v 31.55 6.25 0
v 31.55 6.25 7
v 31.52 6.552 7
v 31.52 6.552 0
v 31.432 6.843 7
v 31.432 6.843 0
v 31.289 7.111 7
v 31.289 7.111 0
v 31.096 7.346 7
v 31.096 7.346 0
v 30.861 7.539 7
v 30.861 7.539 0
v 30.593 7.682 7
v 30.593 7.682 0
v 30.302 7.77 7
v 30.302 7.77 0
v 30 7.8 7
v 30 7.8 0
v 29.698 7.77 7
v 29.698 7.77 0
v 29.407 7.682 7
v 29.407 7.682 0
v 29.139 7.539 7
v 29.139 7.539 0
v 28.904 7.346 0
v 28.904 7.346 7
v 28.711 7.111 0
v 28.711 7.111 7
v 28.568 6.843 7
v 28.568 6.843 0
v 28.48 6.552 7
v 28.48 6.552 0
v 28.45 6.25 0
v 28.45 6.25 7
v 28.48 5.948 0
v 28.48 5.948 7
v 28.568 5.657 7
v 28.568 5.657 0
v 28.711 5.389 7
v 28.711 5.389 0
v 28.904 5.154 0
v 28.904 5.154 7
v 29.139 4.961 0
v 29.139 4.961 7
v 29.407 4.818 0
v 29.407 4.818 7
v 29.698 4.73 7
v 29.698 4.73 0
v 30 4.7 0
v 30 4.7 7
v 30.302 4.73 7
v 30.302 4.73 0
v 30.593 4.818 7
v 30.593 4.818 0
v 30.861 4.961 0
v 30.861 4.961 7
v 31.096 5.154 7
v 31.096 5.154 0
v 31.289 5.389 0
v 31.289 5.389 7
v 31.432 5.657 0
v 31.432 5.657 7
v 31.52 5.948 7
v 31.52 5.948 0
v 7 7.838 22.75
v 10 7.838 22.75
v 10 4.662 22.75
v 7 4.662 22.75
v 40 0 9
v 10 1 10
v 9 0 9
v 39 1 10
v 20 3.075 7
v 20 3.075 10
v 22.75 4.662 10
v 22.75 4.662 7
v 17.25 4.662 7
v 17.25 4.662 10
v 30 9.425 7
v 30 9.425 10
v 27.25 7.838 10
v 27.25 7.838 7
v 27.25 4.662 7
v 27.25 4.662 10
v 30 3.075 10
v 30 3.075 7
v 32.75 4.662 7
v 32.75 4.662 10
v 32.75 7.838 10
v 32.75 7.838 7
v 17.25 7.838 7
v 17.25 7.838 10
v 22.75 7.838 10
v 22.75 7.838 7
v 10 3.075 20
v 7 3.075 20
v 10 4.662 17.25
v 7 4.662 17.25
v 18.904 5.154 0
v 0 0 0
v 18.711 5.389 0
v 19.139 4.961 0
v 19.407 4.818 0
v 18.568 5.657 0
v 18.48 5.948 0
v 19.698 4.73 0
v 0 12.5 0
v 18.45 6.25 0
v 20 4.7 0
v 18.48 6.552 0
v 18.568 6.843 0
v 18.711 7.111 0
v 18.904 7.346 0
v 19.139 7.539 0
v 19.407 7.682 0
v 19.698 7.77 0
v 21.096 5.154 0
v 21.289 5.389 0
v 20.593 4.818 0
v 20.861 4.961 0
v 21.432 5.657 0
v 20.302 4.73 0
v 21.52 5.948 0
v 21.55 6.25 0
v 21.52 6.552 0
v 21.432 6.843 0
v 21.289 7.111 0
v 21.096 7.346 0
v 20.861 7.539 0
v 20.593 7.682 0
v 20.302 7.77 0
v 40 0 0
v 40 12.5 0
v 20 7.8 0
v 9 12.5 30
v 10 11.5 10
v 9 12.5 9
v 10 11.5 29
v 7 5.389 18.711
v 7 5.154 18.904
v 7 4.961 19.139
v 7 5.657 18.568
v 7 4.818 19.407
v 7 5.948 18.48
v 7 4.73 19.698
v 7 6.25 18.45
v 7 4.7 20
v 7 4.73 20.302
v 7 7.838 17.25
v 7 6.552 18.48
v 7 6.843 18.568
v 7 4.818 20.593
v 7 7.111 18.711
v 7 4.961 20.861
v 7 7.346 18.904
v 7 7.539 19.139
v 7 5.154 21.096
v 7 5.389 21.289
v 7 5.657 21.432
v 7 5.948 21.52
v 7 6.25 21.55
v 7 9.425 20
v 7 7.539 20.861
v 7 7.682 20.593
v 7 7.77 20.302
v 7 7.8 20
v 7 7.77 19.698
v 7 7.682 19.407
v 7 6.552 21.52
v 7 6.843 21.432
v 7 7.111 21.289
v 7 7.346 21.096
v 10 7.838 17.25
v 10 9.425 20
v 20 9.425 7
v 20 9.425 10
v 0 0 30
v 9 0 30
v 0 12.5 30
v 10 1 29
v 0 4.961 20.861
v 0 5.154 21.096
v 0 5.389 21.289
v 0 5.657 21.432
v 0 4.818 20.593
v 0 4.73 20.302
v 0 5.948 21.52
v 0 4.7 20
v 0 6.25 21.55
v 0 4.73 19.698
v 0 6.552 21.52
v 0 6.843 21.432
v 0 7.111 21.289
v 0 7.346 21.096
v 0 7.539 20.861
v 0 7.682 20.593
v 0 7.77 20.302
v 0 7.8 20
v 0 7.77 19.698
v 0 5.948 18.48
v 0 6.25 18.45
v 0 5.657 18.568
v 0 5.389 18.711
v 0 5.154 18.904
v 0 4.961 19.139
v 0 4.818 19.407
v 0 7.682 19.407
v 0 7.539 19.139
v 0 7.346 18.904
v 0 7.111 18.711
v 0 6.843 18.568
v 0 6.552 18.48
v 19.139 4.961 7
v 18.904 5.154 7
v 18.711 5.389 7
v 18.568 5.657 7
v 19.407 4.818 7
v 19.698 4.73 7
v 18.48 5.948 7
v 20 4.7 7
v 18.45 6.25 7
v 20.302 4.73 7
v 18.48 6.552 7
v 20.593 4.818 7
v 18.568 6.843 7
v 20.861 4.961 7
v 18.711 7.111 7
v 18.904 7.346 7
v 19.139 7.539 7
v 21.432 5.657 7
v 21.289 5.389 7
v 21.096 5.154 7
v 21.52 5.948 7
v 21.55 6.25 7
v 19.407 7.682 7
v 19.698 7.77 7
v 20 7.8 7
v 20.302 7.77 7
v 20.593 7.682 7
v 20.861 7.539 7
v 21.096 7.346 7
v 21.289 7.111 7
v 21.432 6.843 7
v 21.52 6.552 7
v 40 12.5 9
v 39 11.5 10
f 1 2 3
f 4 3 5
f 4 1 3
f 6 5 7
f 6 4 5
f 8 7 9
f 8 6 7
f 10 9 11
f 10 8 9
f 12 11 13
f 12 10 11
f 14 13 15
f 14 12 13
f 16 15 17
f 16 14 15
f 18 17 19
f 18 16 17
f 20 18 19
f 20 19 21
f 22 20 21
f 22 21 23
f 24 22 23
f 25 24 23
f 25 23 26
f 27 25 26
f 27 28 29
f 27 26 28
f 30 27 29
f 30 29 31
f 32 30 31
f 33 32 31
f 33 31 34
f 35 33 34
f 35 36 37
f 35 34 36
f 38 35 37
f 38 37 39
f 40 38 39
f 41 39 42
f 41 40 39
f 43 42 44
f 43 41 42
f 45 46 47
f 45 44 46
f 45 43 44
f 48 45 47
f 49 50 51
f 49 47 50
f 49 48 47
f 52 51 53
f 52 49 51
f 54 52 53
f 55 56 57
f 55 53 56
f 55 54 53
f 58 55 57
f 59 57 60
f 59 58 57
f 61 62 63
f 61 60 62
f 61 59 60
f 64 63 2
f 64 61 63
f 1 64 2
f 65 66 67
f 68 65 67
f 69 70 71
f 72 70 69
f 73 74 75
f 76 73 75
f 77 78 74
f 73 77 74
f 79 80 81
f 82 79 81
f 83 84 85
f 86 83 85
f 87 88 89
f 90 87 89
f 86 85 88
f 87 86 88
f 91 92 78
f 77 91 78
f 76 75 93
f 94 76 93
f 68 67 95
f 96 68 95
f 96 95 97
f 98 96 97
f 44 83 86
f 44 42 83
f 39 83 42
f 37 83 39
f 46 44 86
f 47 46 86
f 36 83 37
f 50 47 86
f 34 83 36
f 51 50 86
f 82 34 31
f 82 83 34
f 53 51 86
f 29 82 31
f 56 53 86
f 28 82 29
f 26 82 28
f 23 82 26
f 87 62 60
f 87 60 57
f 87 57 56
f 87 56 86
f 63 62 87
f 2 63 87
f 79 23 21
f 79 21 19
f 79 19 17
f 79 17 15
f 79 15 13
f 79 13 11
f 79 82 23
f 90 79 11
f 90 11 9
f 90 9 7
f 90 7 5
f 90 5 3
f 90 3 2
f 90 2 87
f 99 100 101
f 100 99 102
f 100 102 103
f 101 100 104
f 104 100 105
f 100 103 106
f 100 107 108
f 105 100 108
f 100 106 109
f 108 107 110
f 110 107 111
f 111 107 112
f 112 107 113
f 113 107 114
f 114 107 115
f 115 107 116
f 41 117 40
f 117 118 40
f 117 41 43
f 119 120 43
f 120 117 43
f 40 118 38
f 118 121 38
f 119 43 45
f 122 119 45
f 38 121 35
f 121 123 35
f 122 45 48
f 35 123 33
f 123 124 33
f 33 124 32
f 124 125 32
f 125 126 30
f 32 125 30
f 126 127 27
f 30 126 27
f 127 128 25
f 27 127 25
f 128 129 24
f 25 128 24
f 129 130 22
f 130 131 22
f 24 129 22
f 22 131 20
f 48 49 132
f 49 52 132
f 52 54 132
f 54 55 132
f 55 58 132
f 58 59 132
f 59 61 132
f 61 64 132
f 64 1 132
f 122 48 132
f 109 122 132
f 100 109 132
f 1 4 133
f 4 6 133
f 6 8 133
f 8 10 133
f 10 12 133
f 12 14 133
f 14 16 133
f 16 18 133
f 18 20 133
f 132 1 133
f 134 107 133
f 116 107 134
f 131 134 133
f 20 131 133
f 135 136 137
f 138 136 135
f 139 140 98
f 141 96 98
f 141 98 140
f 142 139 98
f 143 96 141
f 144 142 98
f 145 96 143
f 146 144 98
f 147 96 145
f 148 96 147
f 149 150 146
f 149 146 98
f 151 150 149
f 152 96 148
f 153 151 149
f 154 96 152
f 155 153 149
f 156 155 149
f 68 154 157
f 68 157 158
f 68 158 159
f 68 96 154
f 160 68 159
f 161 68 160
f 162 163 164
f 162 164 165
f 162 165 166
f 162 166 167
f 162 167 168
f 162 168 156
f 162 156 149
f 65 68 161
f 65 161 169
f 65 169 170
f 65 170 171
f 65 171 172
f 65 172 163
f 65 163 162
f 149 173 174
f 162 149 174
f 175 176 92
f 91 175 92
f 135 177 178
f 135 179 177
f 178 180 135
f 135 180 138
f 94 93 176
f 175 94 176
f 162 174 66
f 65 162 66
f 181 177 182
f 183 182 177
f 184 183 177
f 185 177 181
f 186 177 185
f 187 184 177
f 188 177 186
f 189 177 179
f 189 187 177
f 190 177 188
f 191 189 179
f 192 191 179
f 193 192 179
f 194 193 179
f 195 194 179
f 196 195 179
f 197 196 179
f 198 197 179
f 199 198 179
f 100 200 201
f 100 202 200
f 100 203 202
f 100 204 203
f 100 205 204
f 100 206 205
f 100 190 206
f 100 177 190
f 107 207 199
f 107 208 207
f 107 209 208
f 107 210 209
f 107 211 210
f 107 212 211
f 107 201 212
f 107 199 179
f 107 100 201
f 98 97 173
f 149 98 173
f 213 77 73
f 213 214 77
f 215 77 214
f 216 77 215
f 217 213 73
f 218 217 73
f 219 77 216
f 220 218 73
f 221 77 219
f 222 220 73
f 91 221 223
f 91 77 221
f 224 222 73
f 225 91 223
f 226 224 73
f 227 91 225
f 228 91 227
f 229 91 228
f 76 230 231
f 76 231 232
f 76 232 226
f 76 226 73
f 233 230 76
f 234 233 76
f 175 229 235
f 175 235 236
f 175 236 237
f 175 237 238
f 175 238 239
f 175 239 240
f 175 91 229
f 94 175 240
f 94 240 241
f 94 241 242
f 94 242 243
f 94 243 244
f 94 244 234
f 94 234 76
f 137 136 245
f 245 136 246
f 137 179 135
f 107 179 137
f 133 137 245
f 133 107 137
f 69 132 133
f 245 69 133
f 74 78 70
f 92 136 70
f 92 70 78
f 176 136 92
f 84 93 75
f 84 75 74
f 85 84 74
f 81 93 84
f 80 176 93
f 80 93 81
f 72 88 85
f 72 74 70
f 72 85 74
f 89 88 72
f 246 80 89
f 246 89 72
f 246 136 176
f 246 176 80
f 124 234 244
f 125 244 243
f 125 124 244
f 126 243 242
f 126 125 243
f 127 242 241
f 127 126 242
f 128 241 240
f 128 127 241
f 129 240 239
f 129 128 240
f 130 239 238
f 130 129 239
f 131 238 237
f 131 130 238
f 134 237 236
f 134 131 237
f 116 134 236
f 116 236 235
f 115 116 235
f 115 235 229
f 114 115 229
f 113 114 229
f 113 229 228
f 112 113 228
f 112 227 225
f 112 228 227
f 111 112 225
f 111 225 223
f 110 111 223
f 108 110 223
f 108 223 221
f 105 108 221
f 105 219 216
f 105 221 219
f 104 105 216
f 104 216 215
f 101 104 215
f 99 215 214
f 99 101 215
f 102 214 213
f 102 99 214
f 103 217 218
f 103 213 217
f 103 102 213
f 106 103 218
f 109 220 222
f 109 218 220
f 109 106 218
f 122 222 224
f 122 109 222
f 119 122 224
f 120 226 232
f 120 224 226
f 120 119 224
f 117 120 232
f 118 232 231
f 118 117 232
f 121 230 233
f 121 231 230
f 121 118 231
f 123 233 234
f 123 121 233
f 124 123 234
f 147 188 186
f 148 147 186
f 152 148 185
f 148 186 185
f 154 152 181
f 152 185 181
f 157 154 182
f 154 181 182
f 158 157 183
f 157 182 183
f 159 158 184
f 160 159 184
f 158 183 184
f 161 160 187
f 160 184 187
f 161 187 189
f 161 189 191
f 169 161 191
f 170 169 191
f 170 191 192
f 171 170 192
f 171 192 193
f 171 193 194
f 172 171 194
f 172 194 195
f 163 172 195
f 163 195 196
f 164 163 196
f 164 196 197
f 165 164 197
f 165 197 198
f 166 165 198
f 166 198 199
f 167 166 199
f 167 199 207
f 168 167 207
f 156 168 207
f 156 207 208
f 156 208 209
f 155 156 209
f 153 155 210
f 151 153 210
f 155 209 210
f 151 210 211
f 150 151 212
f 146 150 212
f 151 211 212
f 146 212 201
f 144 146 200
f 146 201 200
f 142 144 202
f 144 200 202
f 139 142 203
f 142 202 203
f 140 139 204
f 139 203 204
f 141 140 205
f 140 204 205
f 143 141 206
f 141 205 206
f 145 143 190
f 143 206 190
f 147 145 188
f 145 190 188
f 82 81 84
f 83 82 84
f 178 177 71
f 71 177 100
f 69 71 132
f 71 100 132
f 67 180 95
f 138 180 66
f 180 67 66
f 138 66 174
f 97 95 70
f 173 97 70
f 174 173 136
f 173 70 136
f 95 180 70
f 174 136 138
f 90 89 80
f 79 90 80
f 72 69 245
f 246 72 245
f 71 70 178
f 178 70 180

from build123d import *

# Parameters (mm, degrees)
F0_W     = 30
F0_H     = 12.5
F0_R     = 1.55
F1_DEPTH = 10
F0_W_2   = 10
F2_DEPTH = 30
F3_R     = 1.55
F4_DEPTH = 10
F5_SIZE  = 1
F7_DEPTH = 3
F9_DEPTH = 3


# Not quite as in the source:
# - a feature names something its author has since deleted; it is built from what else it names


with BuildPart() as f1:
    # F0 (on Top) → F1 (new body)
    with BuildSketch(Plane.XY):
        with Locations((25, 6.25)):
            Rectangle(F0_W, F0_H)
        with Locations((20, 6.25)):
            Circle(F0_R, mode=Mode.SUBTRACT)
        with Locations((30, 6.25)):
            Circle(F0_R, mode=Mode.SUBTRACT)
    extrude(amount=F1_DEPTH)

    # F0 (on Top) → F2 (join)
    with BuildSketch(Plane.XY):
        with Locations((5, 6.25)):
            Rectangle(F0_W_2, F0_H)
    extrude(amount=F2_DEPTH)

    # F3 (on face) → F4 (cut)
    with BuildSketch(Plane(origin=(0, 0, 0), x_dir=(0, -1, 0), z_dir=(-1, 0, 0))):
        with Locations((-6.25, 20)):
            Circle(F3_R)
    extrude(amount=-F4_DEPTH, mode=Mode.SUBTRACT)

    # F5
    f5_edges = [f1.edges().sort_by_distance(p)[0] for p in [
        (25, 0, 10),
        (40, 6.25, 10),
        (25, 12.5, 10),
        (10, 12.5, 20),
        (10, 6.25, 30),
        (10, 0, 20),
    ]]
    chamfer(f5_edges, length=F5_SIZE)

    # F6 (on face) → F7 (cut)
    with BuildSketch(Plane.XY.offset(10)):
        Polygon((22.75, 4.6622867597), (22.75, 7.8377132403), (20, 9.4254264805), (17.25, 7.8377132403), (17.25, 4.6622867597), (20, 3.0745735195), align=None)
        Polygon((32.75, 4.6622867597), (32.75, 7.8377132403), (30, 9.4254264805), (27.25, 7.8377132403), (27.25, 4.6622867597), (30, 3.0745735195), align=None)
    extrude(amount=-F7_DEPTH, mode=Mode.SUBTRACT)

    # F8 (on face) → F9 (cut)
    with BuildSketch(Plane.YZ.offset(10)):
        Polygon((4.6622867597, 17.25), (7.8377132403, 17.25), (9.4254264805, 20), (7.8377132403, 22.75), (4.6622867597, 22.75), (3.0745735195, 20), align=None)
    extrude(amount=-F9_DEPTH, mode=Mode.SUBTRACT)


solid = f1.part
